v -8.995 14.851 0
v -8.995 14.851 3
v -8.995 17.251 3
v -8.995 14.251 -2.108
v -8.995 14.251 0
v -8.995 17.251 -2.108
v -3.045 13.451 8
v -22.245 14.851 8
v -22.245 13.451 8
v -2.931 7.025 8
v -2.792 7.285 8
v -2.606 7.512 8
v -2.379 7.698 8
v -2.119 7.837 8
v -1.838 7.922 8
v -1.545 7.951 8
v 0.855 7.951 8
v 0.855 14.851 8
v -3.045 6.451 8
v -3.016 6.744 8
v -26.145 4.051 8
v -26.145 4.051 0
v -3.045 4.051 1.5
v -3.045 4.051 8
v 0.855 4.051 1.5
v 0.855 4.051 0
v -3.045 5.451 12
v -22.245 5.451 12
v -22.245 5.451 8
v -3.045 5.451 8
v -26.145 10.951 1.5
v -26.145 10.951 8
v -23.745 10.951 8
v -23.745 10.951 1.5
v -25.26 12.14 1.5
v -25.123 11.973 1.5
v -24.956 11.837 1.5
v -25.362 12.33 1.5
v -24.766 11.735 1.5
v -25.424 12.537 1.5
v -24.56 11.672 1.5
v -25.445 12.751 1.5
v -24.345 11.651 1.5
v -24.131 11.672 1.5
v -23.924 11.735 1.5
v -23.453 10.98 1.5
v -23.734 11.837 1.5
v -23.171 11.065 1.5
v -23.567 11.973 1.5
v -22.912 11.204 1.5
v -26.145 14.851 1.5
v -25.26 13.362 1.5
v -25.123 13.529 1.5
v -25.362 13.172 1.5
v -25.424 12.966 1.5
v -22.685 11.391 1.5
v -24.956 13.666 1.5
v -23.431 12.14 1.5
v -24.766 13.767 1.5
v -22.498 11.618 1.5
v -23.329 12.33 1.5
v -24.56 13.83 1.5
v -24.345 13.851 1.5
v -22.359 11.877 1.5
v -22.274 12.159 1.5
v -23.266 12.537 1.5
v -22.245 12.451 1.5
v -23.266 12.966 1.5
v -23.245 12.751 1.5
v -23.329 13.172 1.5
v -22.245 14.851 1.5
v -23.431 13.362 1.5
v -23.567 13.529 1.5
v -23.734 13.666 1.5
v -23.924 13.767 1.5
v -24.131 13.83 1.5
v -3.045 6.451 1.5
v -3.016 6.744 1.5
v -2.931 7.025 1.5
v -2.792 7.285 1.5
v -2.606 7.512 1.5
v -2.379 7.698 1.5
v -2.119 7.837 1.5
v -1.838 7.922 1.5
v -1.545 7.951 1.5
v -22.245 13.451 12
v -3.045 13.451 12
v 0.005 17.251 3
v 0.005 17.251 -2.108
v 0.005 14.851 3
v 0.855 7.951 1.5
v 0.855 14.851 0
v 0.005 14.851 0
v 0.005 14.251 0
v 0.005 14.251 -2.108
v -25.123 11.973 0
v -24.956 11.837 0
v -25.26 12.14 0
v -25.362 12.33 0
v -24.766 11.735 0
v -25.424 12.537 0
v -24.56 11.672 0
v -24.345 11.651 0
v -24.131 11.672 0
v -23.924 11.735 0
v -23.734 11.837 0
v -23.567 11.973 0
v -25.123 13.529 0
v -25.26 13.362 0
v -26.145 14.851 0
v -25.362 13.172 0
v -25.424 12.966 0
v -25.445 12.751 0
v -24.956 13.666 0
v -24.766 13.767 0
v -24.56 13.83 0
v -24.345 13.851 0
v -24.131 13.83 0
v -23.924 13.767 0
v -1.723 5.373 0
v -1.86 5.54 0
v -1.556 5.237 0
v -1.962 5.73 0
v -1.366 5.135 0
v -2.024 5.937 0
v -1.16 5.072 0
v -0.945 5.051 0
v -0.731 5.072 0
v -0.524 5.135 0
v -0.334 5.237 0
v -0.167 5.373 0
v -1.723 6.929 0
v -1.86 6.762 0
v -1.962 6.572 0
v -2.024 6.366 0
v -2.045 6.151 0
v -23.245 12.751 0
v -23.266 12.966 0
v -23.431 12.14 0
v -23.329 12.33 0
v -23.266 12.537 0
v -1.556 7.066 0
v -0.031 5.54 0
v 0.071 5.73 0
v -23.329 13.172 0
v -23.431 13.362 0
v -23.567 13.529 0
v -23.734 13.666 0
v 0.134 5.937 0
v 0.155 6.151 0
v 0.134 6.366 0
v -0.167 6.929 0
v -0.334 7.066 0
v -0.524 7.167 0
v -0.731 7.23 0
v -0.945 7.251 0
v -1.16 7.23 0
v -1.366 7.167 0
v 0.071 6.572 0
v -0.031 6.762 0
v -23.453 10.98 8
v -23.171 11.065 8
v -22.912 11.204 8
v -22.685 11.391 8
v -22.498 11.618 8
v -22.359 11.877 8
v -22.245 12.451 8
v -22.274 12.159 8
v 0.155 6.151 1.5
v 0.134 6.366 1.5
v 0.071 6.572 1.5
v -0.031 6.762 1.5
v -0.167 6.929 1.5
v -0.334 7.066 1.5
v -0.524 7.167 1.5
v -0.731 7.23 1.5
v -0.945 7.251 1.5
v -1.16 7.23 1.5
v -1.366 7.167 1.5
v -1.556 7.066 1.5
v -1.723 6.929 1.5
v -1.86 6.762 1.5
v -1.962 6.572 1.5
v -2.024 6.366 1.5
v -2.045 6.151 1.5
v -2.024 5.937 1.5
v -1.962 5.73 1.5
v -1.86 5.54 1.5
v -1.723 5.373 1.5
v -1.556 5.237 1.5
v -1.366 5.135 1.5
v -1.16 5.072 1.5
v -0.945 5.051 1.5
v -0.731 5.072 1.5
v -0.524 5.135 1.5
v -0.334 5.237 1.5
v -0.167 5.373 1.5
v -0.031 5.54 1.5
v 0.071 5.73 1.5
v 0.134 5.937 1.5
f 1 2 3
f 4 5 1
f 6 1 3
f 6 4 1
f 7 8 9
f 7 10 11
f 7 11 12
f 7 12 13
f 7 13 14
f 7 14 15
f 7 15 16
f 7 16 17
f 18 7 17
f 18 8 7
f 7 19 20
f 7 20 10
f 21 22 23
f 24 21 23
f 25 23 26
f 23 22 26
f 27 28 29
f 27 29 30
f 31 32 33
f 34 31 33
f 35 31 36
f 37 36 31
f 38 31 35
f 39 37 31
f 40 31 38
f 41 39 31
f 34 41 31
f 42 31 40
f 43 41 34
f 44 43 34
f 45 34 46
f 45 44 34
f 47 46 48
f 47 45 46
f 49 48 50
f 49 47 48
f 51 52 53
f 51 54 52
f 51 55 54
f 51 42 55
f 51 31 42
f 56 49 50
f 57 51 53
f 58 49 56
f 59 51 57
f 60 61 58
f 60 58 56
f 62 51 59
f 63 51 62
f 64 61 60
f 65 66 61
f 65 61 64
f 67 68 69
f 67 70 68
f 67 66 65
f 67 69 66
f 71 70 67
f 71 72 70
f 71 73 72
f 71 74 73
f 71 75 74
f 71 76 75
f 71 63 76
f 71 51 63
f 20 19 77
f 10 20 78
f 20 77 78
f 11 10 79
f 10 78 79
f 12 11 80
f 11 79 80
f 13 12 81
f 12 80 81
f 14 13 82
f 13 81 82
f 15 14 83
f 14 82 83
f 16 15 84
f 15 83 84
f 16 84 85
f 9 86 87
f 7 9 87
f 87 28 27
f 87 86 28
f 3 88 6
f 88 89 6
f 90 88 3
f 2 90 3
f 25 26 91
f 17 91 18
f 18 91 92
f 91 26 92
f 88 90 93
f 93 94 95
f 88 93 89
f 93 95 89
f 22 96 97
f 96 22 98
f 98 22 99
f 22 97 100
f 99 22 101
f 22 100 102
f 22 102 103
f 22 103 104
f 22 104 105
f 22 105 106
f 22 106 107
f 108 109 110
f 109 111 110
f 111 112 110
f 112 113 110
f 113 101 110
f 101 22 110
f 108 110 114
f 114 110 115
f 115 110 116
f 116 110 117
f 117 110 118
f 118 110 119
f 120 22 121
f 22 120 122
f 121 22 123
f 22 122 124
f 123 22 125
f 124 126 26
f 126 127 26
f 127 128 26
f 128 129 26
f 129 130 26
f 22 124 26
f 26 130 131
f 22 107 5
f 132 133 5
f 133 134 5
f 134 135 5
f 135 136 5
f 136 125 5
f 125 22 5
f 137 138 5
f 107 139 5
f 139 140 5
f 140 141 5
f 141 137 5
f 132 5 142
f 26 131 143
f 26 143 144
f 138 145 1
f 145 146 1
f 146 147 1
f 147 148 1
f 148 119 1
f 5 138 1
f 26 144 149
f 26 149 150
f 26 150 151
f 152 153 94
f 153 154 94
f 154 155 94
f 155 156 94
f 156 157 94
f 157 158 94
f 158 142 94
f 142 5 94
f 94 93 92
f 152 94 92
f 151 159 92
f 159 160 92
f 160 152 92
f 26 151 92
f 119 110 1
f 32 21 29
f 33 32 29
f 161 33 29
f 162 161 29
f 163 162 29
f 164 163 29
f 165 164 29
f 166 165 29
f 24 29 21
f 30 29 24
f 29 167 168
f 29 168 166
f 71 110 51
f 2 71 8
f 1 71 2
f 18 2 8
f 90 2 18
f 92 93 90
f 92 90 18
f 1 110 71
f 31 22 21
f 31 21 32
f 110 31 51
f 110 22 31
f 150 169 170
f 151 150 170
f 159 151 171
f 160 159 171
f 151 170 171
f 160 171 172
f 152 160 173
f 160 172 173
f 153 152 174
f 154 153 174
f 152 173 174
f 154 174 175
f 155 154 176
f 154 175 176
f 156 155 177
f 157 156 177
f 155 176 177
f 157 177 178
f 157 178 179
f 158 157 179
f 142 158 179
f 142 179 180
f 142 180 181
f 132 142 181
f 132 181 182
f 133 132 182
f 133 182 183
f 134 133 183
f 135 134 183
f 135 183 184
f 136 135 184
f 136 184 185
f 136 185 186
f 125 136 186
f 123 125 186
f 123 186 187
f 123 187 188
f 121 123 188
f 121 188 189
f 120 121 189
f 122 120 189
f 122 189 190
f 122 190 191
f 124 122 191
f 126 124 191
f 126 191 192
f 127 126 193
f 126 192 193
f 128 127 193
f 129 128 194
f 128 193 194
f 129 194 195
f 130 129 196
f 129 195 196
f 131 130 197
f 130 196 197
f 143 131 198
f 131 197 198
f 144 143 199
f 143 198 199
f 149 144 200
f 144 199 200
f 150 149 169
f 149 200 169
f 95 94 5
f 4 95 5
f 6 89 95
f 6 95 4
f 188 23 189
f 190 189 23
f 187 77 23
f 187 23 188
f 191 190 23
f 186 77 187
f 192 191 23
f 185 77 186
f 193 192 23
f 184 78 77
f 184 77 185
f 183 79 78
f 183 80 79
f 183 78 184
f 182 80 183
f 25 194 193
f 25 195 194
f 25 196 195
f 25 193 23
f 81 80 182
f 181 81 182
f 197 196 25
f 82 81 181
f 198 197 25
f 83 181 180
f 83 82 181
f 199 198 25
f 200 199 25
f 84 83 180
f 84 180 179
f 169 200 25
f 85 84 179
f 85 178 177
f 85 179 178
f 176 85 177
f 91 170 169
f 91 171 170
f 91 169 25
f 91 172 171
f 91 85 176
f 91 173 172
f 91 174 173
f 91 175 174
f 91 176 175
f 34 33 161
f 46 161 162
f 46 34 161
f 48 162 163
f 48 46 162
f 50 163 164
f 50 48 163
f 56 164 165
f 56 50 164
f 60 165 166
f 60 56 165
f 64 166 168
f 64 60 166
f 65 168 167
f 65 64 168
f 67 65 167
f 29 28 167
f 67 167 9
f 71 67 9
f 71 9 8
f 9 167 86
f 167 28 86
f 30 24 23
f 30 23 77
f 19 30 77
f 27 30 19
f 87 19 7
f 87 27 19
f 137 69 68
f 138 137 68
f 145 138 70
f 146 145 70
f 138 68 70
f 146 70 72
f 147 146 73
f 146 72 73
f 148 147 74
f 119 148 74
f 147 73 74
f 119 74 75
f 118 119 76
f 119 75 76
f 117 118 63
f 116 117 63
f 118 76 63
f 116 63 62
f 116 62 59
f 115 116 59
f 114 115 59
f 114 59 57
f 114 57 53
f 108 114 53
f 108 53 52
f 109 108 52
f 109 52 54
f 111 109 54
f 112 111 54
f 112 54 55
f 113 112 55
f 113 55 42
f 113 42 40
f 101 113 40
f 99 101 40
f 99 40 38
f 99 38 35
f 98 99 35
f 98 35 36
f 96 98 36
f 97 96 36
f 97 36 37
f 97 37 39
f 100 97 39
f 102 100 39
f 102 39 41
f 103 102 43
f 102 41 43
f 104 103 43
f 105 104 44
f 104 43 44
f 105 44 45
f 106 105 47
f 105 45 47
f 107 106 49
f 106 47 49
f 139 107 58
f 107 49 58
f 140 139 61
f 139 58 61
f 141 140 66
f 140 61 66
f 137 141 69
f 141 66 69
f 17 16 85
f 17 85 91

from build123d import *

# Parameters (mm, degrees)
SKETCH_1_W           = 27
SKETCH_1_H           = 10.8
EXTRUDE_1_DEPTH      = 12
SKETCH_2_W           = 3.9
SKETCH_2_H           = 3.9
CUT_EXTRUDE_2_DEPTH  = 10.5
FILLET_3_R           = 1.5
FILLET_4_R           = 1.5
SKETCH_3_R           = 1.1
CUT_EXTRUDE_3_DEPTH  = 2.1
SKETCH_4_W           = 27
SKETCH_4_H           = 10.8
SKETCH_4_W_2         = 19.2
SKETCH_4_H_2         = 8
CUT_EXTRUDE_4_DEPTH  = 4
SKETCH_5_W           = 9
SKETCH_5_H           = 3
EXTRUDE_2_DEPTH      = 2.108
EXTRUDE_2_DEPTH_BACK = 3


with BuildPart() as part:
    # 스케치1 → 보스-돌출1 (new body)
    with BuildSketch(Plane.XY):
        with Locations((-12.645283423, 9.45123242)):
            Rectangle(SKETCH_1_W, SKETCH_1_H)
    extrude(amount=EXTRUDE_1_DEPTH)

    # 스케치2 → 컷-돌출2 (cut)
    with BuildSketch(Plane.XY.offset(12)):
        with Locations((-24.195283423, 12.90123242)):
            Rectangle(SKETCH_2_W, SKETCH_2_H)
        with Locations((-1.095283423, 6.00123242)):
            Rectangle(SKETCH_2_W, SKETCH_2_H)
    extrude(amount=-CUT_EXTRUDE_2_DEPTH, mode=Mode.SUBTRACT)

    # 필렛3
    fillet_3_edges = [part.edges().sort_by_distance(p)[0] for p in [
        (-22.245283423, 10.95123242, 6.75),
    ]]
    fillet(fillet_3_edges, radius=FILLET_3_R)

    # 필렛4
    fillet_4_edges = [part.edges().sort_by_distance(p)[0] for p in [
        (-3.045283423, 7.95123242, 6.75),
    ]]
    fillet(fillet_4_edges, radius=FILLET_4_R)

    # 스케치3 → 컷-돌출3 (cut)
    with BuildSketch(Plane.XY.offset(1.5)):
        with Locations((-24.345283423, 12.75123242)):
            Circle(SKETCH_3_R)
        with Locations((-0.945283423, 6.15123242)):
            Circle(SKETCH_3_R)
    extrude(amount=-CUT_EXTRUDE_3_DEPTH, mode=Mode.SUBTRACT)

    # 스케치4 → 컷-돌출4 (cut)
    with BuildSketch(Plane.XY.offset(12)):
        with Locations((-12.645283423, 9.45123242)):
            Rectangle(SKETCH_4_W, SKETCH_4_H)
        with Locations((-12.645283423, 9.45123242)):
            Rectangle(SKETCH_4_W_2, SKETCH_4_H_2, mode=Mode.SUBTRACT)
    extrude(amount=-CUT_EXTRUDE_4_DEPTH, mode=Mode.SUBTRACT)

    # 스케치5 → 보스-돌출2 (add, two sides)
    with BuildSketch(Plane(origin=(0, 0, 0), x_dir=(-1, 0, 0), z_dir=(0, 0, -1))) as extrude_2_sk:
        with Locations((4.495283423, 15.75123242)):
            Rectangle(SKETCH_5_W, SKETCH_5_H)
    extrude(amount=EXTRUDE_2_DEPTH)
    extrude(extrude_2_sk.sketch, amount=-EXTRUDE_2_DEPTH_BACK)


solid = part.part
